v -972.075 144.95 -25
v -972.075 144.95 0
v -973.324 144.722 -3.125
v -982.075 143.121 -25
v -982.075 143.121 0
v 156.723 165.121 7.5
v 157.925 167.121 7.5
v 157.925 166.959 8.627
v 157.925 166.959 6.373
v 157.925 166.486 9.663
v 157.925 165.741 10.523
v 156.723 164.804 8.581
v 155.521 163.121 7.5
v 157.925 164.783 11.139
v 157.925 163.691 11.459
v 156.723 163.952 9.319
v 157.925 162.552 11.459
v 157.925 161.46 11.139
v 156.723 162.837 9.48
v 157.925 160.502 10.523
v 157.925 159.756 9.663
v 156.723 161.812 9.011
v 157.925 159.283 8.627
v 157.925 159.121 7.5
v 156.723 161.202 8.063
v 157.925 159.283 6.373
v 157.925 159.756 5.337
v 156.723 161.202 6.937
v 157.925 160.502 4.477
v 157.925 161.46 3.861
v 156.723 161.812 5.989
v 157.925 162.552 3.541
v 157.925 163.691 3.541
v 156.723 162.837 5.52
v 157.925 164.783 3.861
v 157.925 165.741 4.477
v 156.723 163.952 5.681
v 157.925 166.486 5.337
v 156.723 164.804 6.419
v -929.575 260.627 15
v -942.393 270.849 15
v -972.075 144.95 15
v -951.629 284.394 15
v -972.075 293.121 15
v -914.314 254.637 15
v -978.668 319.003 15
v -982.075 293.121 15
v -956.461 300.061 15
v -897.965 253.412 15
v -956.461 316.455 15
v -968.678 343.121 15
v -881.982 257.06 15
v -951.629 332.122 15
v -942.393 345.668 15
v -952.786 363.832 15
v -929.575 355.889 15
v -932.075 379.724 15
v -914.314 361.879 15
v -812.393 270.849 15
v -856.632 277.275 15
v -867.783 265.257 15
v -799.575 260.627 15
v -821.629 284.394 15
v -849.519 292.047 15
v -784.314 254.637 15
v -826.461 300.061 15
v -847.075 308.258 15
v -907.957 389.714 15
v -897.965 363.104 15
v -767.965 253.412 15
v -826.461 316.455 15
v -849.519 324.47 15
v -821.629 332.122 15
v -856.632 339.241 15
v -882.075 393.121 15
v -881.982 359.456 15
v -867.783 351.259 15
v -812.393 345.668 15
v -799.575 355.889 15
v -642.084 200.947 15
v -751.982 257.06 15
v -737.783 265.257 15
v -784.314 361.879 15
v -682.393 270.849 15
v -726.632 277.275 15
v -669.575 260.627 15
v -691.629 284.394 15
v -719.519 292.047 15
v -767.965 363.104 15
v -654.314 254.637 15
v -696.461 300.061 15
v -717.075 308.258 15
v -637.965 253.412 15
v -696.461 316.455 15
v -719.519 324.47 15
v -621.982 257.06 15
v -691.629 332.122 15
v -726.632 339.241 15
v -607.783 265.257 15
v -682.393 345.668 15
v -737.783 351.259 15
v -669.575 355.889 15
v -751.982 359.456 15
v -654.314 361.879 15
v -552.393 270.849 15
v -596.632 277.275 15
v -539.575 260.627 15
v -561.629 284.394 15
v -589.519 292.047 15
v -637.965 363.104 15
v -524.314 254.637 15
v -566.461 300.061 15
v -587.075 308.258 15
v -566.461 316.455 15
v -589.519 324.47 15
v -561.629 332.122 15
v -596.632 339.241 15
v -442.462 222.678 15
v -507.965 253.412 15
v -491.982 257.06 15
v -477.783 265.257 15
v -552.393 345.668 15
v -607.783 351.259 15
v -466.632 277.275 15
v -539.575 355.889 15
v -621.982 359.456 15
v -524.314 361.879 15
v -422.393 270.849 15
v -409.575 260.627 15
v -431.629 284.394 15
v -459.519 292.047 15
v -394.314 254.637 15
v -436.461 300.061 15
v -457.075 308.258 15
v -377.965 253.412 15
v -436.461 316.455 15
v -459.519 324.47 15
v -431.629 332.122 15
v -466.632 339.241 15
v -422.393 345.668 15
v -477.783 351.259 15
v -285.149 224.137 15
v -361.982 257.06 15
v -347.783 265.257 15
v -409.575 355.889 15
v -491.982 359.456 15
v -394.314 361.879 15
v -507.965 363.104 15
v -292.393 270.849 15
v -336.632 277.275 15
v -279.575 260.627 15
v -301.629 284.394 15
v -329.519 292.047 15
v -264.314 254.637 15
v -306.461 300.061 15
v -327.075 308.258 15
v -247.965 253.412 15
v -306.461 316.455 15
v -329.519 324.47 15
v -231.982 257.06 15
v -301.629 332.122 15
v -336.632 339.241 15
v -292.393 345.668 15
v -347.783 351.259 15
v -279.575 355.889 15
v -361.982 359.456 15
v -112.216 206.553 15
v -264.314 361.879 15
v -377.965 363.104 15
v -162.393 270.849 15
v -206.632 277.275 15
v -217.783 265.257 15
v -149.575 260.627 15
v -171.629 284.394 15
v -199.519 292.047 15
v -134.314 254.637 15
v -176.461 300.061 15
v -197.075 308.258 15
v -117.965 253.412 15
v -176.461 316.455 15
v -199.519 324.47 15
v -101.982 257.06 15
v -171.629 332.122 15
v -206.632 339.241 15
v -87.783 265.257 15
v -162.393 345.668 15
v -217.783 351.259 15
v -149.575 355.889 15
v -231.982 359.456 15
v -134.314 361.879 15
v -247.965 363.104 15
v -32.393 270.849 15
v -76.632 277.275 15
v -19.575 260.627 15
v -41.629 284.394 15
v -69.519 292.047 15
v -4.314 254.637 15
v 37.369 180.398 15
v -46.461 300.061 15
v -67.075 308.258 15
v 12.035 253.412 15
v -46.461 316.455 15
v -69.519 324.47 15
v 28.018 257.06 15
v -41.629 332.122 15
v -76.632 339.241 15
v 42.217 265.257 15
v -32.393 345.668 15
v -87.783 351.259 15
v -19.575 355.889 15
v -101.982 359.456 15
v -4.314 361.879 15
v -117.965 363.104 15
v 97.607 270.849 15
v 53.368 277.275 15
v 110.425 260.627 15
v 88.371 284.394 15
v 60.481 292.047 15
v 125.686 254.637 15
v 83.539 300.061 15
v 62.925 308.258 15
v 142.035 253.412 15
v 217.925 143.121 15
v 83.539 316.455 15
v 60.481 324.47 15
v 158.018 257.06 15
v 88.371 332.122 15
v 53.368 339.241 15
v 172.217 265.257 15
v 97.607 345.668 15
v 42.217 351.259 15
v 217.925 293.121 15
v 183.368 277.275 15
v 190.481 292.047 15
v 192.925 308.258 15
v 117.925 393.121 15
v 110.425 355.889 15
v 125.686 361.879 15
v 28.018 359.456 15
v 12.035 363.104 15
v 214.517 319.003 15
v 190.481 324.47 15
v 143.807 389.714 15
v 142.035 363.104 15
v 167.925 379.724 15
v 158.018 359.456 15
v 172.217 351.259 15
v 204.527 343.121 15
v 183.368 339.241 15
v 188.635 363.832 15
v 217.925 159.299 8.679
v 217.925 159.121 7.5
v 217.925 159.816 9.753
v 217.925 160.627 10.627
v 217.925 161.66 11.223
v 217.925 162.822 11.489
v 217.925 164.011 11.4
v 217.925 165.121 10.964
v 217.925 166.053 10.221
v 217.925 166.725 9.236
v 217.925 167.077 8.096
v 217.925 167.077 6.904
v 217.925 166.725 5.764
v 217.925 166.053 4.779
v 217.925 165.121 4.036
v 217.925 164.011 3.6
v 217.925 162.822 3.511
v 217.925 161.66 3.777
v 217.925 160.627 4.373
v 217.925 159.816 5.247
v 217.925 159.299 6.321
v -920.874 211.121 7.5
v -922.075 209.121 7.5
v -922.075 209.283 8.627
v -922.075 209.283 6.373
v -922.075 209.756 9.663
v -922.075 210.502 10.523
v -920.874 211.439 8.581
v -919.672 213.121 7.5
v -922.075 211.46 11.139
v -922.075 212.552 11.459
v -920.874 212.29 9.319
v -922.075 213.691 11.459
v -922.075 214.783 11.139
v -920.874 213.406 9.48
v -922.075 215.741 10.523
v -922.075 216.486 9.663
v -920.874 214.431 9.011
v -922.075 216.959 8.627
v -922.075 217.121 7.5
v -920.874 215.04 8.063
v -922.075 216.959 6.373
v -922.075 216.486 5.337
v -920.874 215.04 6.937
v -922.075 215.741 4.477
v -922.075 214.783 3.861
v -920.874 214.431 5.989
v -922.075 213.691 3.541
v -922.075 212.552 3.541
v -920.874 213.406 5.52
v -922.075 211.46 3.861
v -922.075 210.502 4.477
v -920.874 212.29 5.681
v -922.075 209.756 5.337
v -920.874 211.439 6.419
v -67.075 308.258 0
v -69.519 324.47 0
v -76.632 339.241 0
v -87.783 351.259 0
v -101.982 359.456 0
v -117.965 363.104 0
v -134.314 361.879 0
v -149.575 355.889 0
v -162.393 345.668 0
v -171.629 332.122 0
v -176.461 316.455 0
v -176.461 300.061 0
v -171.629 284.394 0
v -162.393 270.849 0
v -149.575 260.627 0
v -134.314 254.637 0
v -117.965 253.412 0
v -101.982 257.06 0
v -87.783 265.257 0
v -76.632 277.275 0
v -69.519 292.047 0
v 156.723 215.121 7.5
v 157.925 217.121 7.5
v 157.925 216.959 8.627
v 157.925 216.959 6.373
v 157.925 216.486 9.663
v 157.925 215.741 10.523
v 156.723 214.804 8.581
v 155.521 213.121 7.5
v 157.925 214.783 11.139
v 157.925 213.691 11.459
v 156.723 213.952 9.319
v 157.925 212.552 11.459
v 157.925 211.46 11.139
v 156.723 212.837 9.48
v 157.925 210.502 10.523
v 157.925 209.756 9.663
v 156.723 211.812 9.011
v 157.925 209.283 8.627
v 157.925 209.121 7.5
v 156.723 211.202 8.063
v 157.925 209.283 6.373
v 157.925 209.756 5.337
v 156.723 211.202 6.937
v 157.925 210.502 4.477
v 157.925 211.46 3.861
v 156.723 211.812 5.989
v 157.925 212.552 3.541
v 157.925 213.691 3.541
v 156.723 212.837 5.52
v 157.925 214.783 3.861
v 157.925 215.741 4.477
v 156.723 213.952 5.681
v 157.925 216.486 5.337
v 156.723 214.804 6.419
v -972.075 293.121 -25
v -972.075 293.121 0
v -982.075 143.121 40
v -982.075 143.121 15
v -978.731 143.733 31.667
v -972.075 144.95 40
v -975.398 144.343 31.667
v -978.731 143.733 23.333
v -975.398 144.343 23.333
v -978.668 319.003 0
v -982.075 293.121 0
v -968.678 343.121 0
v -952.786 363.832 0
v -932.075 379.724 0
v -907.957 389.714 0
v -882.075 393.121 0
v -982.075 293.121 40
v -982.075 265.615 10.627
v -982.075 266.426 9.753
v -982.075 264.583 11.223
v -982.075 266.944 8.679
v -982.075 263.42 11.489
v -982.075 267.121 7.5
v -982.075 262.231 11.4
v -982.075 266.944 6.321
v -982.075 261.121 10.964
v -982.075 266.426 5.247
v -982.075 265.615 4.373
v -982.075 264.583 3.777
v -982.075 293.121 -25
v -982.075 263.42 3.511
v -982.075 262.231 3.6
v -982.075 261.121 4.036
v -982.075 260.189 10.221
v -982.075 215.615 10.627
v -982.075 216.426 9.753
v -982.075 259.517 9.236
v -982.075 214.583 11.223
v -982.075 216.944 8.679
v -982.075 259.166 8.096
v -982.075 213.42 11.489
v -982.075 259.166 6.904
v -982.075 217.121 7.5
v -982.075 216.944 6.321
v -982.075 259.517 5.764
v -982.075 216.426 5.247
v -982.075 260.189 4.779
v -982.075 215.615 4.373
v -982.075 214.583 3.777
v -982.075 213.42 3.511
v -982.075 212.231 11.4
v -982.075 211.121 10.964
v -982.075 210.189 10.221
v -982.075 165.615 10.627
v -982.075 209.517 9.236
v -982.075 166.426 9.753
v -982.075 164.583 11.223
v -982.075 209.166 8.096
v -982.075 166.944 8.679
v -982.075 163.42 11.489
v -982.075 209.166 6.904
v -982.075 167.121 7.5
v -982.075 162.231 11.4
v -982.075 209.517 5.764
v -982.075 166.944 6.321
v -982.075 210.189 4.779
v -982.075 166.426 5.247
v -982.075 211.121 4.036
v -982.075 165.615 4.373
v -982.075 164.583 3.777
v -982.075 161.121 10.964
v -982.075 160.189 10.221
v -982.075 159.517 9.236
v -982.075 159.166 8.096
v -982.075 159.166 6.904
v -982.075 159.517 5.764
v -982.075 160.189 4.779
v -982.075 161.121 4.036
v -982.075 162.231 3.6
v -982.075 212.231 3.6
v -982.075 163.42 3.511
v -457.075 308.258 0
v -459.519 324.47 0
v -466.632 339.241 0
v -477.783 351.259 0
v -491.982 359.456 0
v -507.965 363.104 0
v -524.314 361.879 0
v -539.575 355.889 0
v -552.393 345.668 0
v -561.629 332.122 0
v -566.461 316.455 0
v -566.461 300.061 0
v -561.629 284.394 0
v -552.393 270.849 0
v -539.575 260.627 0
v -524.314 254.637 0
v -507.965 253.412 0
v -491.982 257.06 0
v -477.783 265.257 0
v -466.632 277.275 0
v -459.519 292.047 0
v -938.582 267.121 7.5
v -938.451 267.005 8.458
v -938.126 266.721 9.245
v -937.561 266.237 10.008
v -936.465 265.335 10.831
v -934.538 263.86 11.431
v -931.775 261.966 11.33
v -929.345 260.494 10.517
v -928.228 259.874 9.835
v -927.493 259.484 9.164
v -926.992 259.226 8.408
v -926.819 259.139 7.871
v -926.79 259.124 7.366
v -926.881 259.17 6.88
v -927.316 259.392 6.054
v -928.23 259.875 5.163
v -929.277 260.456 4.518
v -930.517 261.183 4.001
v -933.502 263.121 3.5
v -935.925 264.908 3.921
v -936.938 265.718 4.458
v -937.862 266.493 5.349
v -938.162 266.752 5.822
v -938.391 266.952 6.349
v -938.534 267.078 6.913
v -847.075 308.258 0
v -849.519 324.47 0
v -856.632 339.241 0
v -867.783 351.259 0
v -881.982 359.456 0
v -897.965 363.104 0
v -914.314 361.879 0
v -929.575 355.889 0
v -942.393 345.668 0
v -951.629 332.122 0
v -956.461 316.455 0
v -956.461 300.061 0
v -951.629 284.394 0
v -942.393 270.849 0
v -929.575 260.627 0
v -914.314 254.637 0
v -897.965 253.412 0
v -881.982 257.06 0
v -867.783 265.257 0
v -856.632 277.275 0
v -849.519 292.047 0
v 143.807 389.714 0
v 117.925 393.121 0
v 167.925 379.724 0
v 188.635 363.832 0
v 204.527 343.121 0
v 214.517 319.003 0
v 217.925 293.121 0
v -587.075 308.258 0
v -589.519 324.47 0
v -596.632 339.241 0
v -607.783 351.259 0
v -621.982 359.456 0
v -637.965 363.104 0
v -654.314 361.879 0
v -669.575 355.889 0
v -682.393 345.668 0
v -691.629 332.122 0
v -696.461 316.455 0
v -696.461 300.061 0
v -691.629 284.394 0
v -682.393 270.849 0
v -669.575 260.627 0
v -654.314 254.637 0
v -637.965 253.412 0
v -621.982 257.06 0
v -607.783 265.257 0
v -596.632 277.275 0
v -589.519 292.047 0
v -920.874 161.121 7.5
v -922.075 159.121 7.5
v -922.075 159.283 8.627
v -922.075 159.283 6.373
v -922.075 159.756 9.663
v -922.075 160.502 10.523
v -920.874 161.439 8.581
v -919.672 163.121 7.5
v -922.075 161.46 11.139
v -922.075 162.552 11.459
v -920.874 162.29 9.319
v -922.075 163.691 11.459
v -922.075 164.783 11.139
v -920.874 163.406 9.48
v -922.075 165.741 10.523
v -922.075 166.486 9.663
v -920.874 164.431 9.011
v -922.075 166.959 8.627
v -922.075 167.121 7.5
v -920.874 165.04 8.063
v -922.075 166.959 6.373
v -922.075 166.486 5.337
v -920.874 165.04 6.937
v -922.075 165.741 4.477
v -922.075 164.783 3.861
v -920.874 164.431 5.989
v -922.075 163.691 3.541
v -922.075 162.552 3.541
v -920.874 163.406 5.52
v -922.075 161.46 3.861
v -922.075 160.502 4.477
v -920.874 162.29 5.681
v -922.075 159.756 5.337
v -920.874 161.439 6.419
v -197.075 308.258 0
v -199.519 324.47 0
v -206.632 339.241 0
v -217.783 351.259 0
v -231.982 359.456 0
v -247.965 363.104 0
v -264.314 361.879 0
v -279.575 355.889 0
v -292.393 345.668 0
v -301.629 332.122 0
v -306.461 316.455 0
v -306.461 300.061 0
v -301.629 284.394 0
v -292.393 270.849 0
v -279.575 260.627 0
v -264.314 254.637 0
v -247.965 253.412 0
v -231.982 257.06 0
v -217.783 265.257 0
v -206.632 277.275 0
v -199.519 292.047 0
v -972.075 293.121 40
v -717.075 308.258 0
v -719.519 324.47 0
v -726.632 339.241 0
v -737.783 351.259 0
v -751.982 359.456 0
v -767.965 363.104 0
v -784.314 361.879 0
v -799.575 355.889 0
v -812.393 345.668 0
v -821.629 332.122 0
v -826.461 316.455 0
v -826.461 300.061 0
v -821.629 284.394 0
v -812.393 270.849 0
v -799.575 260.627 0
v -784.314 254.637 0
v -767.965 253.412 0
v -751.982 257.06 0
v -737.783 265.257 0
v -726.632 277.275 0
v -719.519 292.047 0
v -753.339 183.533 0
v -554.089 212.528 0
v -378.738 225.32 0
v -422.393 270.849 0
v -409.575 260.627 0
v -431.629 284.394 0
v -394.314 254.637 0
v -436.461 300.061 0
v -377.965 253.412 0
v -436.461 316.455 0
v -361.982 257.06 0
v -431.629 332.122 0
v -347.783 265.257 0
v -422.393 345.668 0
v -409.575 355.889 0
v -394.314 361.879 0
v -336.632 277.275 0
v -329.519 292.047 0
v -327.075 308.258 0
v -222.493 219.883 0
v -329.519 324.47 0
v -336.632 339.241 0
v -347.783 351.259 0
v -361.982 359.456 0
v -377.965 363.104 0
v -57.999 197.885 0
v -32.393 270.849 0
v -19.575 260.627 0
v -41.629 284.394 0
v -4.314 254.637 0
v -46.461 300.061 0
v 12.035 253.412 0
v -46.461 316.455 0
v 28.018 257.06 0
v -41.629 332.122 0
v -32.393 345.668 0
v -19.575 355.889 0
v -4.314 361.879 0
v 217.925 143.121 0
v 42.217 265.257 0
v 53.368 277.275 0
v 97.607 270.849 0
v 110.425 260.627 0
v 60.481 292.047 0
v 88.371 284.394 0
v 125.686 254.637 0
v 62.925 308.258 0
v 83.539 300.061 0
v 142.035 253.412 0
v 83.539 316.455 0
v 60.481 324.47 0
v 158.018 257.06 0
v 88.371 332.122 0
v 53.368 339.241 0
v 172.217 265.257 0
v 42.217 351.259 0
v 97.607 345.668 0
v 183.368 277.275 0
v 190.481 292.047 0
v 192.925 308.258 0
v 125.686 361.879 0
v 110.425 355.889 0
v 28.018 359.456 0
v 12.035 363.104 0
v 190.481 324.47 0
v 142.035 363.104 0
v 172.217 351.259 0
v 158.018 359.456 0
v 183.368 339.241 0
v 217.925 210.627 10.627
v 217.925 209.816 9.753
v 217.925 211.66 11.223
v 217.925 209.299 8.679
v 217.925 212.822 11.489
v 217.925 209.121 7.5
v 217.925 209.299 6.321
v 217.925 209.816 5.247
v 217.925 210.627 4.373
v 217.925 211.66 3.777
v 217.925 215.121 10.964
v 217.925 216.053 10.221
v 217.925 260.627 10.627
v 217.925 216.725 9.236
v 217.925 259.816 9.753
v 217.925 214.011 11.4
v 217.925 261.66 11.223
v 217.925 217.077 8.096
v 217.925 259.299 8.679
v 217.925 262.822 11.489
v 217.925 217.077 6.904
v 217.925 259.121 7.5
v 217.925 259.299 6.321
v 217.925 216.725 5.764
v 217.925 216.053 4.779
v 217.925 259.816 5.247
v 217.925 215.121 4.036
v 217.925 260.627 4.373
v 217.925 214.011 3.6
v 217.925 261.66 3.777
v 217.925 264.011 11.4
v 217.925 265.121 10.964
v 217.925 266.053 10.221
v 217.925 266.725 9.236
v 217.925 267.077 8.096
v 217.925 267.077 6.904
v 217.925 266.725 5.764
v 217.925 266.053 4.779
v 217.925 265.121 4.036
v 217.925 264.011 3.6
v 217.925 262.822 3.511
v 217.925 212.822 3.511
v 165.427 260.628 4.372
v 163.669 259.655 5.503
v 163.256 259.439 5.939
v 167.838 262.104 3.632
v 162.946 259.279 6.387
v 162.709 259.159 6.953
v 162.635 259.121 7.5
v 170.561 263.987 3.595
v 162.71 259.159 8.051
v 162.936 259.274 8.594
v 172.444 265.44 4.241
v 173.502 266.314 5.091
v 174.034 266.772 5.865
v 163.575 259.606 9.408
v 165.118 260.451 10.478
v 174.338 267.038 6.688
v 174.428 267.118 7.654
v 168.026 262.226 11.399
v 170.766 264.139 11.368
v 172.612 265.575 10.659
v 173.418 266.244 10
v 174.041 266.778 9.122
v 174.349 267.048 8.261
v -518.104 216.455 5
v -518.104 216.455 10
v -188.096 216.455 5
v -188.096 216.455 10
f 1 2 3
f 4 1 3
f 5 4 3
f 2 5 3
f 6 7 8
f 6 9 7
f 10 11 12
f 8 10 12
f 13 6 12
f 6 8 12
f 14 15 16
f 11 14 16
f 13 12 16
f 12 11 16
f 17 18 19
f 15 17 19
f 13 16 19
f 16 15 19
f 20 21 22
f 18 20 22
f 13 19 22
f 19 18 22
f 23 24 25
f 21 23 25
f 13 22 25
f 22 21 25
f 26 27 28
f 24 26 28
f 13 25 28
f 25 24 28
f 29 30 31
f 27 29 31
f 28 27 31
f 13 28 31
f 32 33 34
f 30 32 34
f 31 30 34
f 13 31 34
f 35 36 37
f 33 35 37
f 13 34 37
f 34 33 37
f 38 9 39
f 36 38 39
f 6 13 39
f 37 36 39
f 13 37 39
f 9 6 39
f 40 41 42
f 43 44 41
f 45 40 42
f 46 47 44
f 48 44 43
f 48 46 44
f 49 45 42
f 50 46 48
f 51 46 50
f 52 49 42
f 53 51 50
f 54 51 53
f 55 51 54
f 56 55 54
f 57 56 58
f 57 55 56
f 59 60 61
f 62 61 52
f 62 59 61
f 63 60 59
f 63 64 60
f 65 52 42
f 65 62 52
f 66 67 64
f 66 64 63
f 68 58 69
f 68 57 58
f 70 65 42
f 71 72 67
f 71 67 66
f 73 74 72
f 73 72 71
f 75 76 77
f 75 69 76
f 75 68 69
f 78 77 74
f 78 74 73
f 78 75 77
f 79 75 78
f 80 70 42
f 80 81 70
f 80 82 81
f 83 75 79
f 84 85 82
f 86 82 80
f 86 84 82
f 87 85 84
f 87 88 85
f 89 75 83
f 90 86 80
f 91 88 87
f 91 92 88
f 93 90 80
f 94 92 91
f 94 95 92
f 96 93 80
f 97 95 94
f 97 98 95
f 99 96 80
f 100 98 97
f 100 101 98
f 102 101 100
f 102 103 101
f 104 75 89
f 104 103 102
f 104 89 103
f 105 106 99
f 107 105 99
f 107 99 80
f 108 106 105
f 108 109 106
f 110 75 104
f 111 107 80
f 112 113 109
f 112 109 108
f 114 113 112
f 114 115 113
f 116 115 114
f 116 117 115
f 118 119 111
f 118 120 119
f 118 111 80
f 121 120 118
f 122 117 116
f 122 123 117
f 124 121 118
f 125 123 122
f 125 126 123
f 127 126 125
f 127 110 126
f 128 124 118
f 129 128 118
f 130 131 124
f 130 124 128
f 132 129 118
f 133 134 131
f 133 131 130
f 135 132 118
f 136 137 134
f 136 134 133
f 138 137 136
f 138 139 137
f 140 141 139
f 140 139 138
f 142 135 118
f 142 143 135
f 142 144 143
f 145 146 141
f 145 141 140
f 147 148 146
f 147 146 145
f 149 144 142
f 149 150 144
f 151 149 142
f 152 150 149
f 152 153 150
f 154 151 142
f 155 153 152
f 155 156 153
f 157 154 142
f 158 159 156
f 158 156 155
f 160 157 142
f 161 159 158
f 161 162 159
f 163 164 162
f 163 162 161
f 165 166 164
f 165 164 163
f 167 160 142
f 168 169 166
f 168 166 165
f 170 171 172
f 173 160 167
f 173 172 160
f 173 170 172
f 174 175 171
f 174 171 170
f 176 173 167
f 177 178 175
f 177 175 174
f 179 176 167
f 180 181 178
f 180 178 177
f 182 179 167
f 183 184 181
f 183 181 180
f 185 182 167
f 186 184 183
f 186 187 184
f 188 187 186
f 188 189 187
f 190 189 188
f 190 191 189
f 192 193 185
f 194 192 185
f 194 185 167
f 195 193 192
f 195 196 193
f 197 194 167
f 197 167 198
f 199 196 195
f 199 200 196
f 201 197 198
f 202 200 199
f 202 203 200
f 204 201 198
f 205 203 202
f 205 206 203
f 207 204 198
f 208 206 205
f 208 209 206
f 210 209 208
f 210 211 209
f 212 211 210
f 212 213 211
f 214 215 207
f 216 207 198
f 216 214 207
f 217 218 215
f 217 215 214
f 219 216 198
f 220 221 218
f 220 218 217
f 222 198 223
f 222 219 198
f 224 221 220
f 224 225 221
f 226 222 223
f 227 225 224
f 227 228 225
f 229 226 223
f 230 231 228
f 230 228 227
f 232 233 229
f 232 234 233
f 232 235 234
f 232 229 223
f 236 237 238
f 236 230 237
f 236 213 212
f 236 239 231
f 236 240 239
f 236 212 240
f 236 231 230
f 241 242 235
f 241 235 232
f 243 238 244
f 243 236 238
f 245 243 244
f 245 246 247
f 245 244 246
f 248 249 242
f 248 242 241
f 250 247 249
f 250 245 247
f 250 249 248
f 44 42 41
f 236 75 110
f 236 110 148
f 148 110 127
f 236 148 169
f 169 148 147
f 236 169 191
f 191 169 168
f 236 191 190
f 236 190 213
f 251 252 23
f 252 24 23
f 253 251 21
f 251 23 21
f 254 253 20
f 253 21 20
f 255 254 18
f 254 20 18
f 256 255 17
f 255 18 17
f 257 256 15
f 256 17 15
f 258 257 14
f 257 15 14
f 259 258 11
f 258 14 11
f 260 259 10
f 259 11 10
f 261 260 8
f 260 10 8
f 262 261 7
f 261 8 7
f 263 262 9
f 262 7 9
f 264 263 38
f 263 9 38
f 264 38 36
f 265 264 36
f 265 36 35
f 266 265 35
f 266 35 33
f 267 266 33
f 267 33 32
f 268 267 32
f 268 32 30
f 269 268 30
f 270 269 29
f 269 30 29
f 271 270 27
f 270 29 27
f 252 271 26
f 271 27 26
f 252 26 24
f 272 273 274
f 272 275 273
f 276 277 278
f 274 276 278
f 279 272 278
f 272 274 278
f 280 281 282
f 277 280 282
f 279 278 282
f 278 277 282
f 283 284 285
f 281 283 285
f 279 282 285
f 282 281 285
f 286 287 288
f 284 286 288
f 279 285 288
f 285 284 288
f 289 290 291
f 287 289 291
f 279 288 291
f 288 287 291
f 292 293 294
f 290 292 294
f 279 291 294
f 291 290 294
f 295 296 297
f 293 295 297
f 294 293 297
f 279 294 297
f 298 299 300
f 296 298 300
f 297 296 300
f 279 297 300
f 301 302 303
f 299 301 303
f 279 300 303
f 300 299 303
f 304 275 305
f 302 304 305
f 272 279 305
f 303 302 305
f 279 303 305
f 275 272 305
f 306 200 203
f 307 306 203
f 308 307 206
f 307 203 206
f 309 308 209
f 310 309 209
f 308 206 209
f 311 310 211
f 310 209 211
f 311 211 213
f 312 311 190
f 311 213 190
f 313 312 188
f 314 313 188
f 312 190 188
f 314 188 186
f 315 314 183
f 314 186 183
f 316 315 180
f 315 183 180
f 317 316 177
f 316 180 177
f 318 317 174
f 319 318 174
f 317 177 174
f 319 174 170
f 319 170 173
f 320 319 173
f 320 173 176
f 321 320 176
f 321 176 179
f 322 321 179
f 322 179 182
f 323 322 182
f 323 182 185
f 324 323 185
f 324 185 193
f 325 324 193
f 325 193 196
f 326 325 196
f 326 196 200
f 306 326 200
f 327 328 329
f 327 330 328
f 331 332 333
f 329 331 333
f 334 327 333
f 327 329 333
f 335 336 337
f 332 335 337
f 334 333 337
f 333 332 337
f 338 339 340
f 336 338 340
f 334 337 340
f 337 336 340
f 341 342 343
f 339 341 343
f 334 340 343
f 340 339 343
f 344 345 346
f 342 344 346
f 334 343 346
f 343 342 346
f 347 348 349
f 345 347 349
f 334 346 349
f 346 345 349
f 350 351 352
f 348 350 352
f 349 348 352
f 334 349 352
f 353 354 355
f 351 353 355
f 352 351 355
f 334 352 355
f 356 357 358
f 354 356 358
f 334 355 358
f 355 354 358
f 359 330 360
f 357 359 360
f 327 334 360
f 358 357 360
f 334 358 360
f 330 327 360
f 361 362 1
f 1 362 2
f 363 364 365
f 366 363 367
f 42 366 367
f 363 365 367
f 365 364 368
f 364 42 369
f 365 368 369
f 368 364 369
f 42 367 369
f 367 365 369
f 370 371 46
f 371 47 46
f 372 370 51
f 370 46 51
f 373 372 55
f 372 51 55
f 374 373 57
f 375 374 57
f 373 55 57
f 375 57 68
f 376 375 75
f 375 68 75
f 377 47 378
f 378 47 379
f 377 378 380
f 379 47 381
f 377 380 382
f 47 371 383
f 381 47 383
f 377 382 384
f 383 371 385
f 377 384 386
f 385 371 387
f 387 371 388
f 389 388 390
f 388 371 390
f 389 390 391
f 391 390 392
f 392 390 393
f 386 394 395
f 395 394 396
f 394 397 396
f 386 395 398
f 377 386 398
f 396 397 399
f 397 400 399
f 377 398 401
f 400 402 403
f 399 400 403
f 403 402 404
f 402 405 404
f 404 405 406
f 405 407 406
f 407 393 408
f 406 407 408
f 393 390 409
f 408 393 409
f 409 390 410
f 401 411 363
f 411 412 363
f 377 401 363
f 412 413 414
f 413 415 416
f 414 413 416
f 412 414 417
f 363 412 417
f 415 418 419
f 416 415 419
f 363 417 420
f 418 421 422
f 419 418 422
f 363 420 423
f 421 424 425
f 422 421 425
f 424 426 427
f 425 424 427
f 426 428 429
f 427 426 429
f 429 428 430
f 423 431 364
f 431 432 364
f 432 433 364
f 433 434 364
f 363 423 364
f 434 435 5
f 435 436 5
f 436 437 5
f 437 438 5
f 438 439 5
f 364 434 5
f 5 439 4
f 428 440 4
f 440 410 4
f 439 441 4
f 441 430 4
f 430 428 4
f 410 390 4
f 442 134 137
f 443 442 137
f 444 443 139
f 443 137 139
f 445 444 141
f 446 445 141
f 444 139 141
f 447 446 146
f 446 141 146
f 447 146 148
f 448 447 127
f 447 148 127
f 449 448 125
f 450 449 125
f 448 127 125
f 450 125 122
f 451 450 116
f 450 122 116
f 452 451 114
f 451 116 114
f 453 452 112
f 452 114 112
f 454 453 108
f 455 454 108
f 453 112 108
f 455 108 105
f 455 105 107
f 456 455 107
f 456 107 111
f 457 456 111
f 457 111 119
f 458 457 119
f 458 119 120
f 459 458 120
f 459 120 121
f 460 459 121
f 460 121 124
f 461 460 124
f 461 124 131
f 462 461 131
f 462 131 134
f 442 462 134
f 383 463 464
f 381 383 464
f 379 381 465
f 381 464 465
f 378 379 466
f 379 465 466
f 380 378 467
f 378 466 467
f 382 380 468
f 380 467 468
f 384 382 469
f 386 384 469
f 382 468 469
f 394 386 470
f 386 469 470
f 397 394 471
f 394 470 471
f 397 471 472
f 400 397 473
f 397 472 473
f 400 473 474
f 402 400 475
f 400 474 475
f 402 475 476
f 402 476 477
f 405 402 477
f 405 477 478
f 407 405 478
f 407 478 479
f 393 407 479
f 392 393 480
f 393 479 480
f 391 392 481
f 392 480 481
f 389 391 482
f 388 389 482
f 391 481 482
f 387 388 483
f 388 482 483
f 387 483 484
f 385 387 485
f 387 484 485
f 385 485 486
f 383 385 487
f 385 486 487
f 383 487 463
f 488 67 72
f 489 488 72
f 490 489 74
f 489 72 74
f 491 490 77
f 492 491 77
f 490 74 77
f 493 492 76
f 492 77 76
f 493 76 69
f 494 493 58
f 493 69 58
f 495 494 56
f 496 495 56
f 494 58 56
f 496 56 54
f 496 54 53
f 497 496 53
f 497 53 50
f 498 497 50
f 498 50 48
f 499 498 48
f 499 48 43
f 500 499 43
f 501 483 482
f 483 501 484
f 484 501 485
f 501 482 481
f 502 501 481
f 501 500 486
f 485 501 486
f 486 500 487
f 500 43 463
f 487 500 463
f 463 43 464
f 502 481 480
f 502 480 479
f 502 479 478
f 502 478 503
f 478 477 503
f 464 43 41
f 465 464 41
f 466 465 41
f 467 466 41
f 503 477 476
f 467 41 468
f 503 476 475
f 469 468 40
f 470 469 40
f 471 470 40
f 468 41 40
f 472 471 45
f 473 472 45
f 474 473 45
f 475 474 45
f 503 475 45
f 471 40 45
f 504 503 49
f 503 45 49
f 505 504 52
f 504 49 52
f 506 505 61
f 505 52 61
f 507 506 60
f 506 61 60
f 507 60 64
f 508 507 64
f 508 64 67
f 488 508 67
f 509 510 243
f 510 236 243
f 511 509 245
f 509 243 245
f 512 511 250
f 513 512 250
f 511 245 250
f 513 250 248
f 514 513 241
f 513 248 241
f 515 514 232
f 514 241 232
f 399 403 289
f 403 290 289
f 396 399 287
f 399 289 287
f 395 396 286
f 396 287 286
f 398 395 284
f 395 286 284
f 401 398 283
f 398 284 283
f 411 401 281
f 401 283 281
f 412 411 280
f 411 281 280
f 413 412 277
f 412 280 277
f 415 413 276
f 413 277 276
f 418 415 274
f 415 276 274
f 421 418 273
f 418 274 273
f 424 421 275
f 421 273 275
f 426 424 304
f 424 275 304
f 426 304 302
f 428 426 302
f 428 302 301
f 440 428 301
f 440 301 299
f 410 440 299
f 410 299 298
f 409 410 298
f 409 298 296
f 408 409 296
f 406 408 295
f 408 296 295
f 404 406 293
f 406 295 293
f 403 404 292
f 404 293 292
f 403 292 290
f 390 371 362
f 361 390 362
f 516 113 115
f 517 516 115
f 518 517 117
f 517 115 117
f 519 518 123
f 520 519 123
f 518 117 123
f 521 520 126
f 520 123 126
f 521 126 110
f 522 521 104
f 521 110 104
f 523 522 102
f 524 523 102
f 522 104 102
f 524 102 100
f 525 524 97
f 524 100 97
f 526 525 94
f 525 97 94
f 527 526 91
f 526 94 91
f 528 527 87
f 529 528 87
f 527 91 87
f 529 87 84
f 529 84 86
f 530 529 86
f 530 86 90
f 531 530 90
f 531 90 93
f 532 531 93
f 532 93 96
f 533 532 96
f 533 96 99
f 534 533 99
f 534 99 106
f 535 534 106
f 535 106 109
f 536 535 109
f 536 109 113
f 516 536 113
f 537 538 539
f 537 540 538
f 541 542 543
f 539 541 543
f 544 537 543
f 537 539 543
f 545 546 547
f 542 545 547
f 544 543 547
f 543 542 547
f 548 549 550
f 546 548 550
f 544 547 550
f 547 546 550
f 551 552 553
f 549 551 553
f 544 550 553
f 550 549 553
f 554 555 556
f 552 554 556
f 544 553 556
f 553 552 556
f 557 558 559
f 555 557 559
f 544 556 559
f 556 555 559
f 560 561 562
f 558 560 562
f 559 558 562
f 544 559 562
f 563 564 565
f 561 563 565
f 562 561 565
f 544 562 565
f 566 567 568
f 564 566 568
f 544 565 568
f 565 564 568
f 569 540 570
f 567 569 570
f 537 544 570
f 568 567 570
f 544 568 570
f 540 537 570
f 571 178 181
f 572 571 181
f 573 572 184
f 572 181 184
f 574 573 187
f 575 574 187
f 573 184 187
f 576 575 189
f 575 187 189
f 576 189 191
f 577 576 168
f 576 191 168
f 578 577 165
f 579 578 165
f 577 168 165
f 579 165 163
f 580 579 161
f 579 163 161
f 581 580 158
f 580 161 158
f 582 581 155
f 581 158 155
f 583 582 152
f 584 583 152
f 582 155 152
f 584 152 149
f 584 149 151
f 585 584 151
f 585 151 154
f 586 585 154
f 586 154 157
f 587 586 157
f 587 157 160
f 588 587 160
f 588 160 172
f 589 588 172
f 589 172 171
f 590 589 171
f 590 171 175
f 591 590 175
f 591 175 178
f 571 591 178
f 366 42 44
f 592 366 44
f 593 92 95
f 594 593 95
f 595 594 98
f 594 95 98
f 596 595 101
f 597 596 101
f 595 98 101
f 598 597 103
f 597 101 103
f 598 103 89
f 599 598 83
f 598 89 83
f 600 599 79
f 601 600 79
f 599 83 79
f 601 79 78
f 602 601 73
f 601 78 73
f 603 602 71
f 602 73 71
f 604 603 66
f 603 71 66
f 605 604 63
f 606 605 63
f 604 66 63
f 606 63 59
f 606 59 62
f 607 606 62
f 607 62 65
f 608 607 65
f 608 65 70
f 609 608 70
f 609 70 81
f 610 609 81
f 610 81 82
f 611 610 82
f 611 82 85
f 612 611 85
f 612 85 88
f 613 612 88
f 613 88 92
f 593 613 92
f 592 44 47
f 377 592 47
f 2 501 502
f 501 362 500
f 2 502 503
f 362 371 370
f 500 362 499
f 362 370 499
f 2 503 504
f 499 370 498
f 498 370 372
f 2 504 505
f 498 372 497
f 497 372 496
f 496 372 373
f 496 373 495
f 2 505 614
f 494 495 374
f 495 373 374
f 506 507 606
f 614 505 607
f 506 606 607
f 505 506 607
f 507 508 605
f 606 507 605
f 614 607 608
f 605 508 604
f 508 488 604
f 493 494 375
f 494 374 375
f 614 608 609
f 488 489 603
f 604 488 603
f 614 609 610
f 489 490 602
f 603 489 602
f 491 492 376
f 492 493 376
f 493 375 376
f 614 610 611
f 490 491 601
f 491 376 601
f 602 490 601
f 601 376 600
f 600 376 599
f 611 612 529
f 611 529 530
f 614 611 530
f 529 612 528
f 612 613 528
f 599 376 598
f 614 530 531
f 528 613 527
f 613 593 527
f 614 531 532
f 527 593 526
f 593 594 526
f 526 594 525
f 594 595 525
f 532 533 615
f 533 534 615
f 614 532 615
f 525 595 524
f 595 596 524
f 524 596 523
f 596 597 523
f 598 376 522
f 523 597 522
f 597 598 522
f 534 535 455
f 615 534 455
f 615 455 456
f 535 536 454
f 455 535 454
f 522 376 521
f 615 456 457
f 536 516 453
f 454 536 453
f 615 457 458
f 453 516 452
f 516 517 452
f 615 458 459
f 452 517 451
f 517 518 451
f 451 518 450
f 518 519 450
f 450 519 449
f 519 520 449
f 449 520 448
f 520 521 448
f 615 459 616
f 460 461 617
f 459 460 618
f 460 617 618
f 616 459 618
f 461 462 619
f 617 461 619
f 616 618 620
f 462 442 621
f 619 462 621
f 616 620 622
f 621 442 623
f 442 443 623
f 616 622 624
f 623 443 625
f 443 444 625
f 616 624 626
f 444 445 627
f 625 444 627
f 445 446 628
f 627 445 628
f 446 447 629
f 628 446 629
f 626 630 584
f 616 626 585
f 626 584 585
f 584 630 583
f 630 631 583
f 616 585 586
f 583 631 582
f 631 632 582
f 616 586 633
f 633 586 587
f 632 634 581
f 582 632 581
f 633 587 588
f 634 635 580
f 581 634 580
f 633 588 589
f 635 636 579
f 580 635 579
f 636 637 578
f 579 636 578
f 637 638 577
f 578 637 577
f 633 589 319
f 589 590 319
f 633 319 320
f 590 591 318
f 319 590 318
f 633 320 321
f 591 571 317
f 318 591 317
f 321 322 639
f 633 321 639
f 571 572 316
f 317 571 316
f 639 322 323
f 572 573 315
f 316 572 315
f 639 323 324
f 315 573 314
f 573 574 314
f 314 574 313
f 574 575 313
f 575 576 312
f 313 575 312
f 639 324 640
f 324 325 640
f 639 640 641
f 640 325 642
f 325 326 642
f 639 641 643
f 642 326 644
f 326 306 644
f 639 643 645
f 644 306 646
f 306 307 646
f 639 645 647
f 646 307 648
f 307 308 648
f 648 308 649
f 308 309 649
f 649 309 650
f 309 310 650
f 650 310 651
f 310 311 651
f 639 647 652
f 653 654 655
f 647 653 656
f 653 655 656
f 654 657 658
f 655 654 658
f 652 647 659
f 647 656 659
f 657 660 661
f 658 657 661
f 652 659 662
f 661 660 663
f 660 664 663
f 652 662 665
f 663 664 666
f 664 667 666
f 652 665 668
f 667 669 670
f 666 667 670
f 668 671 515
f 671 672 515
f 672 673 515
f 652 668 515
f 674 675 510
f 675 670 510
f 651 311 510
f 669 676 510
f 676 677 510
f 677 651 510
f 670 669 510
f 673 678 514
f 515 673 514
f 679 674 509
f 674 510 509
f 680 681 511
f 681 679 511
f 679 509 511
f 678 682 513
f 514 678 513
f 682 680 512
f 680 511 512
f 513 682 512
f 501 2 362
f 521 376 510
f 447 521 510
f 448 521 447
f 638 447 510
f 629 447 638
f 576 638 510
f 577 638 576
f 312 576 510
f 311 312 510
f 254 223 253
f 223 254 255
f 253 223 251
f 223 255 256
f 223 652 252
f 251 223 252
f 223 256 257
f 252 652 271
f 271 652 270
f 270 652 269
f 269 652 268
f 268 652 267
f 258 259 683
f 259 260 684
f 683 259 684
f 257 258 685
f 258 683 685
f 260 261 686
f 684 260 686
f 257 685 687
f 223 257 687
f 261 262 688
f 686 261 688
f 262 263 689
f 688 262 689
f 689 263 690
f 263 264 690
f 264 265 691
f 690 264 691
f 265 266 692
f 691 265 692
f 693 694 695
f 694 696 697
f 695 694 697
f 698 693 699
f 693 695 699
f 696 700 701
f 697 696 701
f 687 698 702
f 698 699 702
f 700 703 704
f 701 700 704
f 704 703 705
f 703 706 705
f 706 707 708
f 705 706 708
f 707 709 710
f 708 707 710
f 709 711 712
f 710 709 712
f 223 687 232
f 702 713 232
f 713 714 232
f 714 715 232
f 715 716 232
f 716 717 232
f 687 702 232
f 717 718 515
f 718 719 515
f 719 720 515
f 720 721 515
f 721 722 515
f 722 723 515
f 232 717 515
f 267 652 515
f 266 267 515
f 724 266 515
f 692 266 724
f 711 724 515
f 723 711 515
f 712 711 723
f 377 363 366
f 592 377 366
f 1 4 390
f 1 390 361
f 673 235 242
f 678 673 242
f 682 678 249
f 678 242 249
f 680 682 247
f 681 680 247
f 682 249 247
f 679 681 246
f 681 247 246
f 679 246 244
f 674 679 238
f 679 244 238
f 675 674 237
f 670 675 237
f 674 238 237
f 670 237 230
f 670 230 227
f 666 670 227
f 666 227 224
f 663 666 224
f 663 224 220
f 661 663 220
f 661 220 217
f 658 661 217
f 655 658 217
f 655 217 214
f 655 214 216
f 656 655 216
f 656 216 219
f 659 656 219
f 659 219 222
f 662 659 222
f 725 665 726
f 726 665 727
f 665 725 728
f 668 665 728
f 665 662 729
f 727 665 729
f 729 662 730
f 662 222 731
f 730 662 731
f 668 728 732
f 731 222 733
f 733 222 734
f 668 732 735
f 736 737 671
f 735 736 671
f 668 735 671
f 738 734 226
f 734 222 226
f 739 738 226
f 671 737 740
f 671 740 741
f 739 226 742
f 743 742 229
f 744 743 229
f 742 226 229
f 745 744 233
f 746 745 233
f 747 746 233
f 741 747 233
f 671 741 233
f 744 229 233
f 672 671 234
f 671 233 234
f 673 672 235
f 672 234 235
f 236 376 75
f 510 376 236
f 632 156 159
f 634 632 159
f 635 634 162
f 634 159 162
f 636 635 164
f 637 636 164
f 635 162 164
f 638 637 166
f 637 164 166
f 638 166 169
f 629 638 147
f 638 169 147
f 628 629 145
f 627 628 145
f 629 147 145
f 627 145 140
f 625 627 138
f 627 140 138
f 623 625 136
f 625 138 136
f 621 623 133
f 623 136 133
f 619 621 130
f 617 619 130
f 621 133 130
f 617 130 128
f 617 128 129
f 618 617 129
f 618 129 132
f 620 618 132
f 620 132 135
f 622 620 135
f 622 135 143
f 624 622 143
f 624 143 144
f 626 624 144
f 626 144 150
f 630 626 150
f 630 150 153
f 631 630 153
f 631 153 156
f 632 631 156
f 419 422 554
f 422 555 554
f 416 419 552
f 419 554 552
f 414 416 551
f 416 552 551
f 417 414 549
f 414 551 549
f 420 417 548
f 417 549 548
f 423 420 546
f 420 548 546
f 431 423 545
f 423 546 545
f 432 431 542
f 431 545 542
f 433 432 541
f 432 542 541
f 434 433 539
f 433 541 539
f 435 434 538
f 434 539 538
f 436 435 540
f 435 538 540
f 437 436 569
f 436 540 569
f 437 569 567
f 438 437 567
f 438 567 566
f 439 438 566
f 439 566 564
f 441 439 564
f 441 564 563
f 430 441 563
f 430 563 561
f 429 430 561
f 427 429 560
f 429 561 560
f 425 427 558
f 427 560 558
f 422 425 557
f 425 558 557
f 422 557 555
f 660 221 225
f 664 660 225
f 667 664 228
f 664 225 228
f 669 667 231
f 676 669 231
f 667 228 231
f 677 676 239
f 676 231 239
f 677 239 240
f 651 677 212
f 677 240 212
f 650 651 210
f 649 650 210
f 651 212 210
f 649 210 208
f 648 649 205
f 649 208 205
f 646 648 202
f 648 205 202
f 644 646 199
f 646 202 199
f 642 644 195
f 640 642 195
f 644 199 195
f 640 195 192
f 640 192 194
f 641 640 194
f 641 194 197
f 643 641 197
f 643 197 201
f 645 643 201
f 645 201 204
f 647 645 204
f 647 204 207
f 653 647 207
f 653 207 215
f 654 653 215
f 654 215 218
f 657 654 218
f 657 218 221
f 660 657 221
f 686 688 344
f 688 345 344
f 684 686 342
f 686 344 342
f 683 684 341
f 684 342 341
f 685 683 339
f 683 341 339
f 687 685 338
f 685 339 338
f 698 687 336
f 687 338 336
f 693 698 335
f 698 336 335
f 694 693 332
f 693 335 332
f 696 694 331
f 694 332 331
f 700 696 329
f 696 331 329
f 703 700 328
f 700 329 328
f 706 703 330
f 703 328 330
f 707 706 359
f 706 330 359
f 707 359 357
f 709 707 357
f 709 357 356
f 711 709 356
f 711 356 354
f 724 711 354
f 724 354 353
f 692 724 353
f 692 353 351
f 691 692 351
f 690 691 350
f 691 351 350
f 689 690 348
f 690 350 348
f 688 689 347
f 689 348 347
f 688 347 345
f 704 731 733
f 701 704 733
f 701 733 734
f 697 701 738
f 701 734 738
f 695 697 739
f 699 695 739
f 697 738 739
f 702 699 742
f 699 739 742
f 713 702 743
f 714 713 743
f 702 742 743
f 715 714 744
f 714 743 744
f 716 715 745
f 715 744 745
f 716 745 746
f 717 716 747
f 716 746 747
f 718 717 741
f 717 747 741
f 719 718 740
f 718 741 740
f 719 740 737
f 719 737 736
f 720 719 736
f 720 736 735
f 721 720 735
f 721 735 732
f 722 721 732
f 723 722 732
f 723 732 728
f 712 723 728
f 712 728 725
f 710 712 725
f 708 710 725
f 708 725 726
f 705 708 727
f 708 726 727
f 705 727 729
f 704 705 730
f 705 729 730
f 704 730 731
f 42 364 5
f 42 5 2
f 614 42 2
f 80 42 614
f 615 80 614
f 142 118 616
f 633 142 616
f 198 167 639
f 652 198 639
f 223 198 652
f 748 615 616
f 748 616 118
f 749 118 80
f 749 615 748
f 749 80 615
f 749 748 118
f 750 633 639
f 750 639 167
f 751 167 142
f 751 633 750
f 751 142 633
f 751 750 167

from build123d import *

# Parameters (mm, degrees)
F0_W      = 1200
F0_H      = 250
F1_DEPTH  = 15
F3_DEPTH  = 25
F4_R      = 100
F6_D      = 8
F6_DEPTH  = 60
F6_TIP    = 2.4034424761
F8_D      = 8
F8_DEPTH  = 60
F8_TIP    = 2.4034424761
F9_R      = 55
F10_DEPTH = 25
F12_DEPTH = 25
F14_DEPTH = 25


# Not quite as in the source:
# - a feature names something its author has since deleted; it is built from what else it names


with BuildPart() as f1:
    # F0 (on Top) → F1 (new body)
    with BuildSketch(Plane.XY):
        with Locations((-382.0752739906, 268.1212723255)):
            Rectangle(F0_W, F0_H)
    extrude(amount=F1_DEPTH)

    # F2 (on face) → F3 (cut)
    with BuildSketch(Plane.XY.offset(15)):
        with BuildLine():
            add(Edge.make_bspline(
                [(-982.0752739906, 143.1212723255), (-381.1290302773, 253.1212723255), (-296.0948119124, 253.1212723255), (217.9247260094, 143.1212723255)],
                knots=[0, 0, 0, 0, 1200, 1200, 1200, 1200], degree=3))
            Line((-982.0752739906, 143.1212723255), (217.9247260094, 143.1212723255))
        make_face()
    extrude(amount=-F3_DEPTH, mode=Mode.SUBTRACT)

    # F4
    f4_edges = [f1.edges().sort_by_distance(p)[0] for p in [
        (-982.075274, 393.121272, 7.5),
        (217.924726, 393.121272, 7.5),
    ]]
    fillet(f4_edges, radius=F4_R)

    # F6
    with Locations(Plane(origin=(-982.0752739906, 0, 0), x_dir=(0, -1, 0), z_dir=(-1, 0, 0))):
        with Locations((-163.1212723255, 7.5), (-213.1212723255, 7.5), (-263.1212723255, 7.5)):
            Hole(F6_D / 2, depth=F6_DEPTH)
            with Locations((0, 0, -(F6_DEPTH + F6_TIP / 2))):  # 118° drill point
                Cone(0, F6_D / 2, F6_TIP, mode=Mode.SUBTRACT)

    # F8
    with Locations(Plane.YZ.offset(217.9247260094)):
        with Locations((163.1212723255, 7.5), (213.1212723255, 7.5), (263.1212723255, 7.5)):
            Hole(F8_D / 2, depth=F8_DEPTH)
            with Locations((0, 0, -(F8_DEPTH + F8_TIP / 2))):  # 118° drill point
                Cone(0, F8_D / 2, F8_TIP, mode=Mode.SUBTRACT)

    # F9 (on face) → F10 (cut)
    with BuildSketch(Plane.XY.offset(15)):
        with Locations((-902.0752739906, 308.2580530366)):
            Circle(F9_R)
        with Locations((-772.0752739906, 308.2580530366)):
            Circle(F9_R)
        with Locations((-642.0752739906, 308.2580530366)):
            Circle(F9_R)
        with Locations((-512.0752739906, 308.2580530366)):
            Circle(F9_R)
        with Locations((-382.0752739906, 308.2580530366)):
            Circle(F9_R)
        with Locations((-252.0752739906, 308.2580530366)):
            Circle(F9_R)
        with Locations((-122.0752739906, 308.2580530366)):
            Circle(F9_R)
        with Locations((7.9247260094, 308.2580530366)):
            Circle(F9_R)
        with Locations((137.9247260094, 308.2580530366)):
            Circle(F9_R)
    extrude(amount=-F10_DEPTH, mode=Mode.SUBTRACT)

    # F11 (on face) → F12 (join)
    with BuildSketch(Plane(origin=(0, 0, 0), x_dir=(1, 0, 0), z_dir=(0, 0, -1))):
        with BuildLine():
            add(Edge.make_bspline(
                [(-972.0752739906, -144.9502384932), (-973.3234960268, -144.7221332236), (-974.5722289185, -144.4938787017), (-975.8214712324, -144.265475917), (-977.0712215354, -144.0369258537), (-978.3214783948, -143.8082294911), (-979.5722403783, -143.5793878034), (-980.823506054, -143.3504017601), (-982.0752739906, -143.1212723255)],
                knots=[0.9928997665, 0.9928997665, 0.9928997665, 0.9928997665, 0.9928997665, 0.9928997665, 0.9928997665, 0.9928997665, 0.9928997665, 1, 1, 1, 1, 1, 1, 1, 1, 1], degree=8))
            Line((-982.0752739906, -143.1212723255), (-982.0752739906, -293.1212723255))
            Line((-982.0752739906, -293.1212723255), (-972.0752739906, -293.1212723255))
            Line((-972.0752739906, -293.1212723255), (-972.0752739906, -144.9502384932))
        make_face()
    extrude(amount=F12_DEPTH)

    # F13 (on face) → F14 (join)
    with BuildSketch(Plane.XY.offset(15)):
        with BuildLine():
            Line((-982.0752739906, 293.1212723255), (-982.0752739906, 143.1212723255))
            add(Edge.make_bspline(
                [(-982.0752739906, 143.1212723255), (-978.7259696098, 143.7343446023), (-975.3926908046, 144.3439999918), (-972.0752739906, 144.9502384937)],
                knots=[0, 0, 0, 0, 6.6880612018, 6.6880612018, 6.6880612018, 6.6880612018], degree=3))
            Line((-972.0752739906, 144.9502384937), (-972.0752739906, 293.1212723255))
            Line((-972.0752739906, 293.1212723255), (-982.0752739906, 293.1212723255))
        make_face()
    extrude(amount=F14_DEPTH)


solid = f1.part
